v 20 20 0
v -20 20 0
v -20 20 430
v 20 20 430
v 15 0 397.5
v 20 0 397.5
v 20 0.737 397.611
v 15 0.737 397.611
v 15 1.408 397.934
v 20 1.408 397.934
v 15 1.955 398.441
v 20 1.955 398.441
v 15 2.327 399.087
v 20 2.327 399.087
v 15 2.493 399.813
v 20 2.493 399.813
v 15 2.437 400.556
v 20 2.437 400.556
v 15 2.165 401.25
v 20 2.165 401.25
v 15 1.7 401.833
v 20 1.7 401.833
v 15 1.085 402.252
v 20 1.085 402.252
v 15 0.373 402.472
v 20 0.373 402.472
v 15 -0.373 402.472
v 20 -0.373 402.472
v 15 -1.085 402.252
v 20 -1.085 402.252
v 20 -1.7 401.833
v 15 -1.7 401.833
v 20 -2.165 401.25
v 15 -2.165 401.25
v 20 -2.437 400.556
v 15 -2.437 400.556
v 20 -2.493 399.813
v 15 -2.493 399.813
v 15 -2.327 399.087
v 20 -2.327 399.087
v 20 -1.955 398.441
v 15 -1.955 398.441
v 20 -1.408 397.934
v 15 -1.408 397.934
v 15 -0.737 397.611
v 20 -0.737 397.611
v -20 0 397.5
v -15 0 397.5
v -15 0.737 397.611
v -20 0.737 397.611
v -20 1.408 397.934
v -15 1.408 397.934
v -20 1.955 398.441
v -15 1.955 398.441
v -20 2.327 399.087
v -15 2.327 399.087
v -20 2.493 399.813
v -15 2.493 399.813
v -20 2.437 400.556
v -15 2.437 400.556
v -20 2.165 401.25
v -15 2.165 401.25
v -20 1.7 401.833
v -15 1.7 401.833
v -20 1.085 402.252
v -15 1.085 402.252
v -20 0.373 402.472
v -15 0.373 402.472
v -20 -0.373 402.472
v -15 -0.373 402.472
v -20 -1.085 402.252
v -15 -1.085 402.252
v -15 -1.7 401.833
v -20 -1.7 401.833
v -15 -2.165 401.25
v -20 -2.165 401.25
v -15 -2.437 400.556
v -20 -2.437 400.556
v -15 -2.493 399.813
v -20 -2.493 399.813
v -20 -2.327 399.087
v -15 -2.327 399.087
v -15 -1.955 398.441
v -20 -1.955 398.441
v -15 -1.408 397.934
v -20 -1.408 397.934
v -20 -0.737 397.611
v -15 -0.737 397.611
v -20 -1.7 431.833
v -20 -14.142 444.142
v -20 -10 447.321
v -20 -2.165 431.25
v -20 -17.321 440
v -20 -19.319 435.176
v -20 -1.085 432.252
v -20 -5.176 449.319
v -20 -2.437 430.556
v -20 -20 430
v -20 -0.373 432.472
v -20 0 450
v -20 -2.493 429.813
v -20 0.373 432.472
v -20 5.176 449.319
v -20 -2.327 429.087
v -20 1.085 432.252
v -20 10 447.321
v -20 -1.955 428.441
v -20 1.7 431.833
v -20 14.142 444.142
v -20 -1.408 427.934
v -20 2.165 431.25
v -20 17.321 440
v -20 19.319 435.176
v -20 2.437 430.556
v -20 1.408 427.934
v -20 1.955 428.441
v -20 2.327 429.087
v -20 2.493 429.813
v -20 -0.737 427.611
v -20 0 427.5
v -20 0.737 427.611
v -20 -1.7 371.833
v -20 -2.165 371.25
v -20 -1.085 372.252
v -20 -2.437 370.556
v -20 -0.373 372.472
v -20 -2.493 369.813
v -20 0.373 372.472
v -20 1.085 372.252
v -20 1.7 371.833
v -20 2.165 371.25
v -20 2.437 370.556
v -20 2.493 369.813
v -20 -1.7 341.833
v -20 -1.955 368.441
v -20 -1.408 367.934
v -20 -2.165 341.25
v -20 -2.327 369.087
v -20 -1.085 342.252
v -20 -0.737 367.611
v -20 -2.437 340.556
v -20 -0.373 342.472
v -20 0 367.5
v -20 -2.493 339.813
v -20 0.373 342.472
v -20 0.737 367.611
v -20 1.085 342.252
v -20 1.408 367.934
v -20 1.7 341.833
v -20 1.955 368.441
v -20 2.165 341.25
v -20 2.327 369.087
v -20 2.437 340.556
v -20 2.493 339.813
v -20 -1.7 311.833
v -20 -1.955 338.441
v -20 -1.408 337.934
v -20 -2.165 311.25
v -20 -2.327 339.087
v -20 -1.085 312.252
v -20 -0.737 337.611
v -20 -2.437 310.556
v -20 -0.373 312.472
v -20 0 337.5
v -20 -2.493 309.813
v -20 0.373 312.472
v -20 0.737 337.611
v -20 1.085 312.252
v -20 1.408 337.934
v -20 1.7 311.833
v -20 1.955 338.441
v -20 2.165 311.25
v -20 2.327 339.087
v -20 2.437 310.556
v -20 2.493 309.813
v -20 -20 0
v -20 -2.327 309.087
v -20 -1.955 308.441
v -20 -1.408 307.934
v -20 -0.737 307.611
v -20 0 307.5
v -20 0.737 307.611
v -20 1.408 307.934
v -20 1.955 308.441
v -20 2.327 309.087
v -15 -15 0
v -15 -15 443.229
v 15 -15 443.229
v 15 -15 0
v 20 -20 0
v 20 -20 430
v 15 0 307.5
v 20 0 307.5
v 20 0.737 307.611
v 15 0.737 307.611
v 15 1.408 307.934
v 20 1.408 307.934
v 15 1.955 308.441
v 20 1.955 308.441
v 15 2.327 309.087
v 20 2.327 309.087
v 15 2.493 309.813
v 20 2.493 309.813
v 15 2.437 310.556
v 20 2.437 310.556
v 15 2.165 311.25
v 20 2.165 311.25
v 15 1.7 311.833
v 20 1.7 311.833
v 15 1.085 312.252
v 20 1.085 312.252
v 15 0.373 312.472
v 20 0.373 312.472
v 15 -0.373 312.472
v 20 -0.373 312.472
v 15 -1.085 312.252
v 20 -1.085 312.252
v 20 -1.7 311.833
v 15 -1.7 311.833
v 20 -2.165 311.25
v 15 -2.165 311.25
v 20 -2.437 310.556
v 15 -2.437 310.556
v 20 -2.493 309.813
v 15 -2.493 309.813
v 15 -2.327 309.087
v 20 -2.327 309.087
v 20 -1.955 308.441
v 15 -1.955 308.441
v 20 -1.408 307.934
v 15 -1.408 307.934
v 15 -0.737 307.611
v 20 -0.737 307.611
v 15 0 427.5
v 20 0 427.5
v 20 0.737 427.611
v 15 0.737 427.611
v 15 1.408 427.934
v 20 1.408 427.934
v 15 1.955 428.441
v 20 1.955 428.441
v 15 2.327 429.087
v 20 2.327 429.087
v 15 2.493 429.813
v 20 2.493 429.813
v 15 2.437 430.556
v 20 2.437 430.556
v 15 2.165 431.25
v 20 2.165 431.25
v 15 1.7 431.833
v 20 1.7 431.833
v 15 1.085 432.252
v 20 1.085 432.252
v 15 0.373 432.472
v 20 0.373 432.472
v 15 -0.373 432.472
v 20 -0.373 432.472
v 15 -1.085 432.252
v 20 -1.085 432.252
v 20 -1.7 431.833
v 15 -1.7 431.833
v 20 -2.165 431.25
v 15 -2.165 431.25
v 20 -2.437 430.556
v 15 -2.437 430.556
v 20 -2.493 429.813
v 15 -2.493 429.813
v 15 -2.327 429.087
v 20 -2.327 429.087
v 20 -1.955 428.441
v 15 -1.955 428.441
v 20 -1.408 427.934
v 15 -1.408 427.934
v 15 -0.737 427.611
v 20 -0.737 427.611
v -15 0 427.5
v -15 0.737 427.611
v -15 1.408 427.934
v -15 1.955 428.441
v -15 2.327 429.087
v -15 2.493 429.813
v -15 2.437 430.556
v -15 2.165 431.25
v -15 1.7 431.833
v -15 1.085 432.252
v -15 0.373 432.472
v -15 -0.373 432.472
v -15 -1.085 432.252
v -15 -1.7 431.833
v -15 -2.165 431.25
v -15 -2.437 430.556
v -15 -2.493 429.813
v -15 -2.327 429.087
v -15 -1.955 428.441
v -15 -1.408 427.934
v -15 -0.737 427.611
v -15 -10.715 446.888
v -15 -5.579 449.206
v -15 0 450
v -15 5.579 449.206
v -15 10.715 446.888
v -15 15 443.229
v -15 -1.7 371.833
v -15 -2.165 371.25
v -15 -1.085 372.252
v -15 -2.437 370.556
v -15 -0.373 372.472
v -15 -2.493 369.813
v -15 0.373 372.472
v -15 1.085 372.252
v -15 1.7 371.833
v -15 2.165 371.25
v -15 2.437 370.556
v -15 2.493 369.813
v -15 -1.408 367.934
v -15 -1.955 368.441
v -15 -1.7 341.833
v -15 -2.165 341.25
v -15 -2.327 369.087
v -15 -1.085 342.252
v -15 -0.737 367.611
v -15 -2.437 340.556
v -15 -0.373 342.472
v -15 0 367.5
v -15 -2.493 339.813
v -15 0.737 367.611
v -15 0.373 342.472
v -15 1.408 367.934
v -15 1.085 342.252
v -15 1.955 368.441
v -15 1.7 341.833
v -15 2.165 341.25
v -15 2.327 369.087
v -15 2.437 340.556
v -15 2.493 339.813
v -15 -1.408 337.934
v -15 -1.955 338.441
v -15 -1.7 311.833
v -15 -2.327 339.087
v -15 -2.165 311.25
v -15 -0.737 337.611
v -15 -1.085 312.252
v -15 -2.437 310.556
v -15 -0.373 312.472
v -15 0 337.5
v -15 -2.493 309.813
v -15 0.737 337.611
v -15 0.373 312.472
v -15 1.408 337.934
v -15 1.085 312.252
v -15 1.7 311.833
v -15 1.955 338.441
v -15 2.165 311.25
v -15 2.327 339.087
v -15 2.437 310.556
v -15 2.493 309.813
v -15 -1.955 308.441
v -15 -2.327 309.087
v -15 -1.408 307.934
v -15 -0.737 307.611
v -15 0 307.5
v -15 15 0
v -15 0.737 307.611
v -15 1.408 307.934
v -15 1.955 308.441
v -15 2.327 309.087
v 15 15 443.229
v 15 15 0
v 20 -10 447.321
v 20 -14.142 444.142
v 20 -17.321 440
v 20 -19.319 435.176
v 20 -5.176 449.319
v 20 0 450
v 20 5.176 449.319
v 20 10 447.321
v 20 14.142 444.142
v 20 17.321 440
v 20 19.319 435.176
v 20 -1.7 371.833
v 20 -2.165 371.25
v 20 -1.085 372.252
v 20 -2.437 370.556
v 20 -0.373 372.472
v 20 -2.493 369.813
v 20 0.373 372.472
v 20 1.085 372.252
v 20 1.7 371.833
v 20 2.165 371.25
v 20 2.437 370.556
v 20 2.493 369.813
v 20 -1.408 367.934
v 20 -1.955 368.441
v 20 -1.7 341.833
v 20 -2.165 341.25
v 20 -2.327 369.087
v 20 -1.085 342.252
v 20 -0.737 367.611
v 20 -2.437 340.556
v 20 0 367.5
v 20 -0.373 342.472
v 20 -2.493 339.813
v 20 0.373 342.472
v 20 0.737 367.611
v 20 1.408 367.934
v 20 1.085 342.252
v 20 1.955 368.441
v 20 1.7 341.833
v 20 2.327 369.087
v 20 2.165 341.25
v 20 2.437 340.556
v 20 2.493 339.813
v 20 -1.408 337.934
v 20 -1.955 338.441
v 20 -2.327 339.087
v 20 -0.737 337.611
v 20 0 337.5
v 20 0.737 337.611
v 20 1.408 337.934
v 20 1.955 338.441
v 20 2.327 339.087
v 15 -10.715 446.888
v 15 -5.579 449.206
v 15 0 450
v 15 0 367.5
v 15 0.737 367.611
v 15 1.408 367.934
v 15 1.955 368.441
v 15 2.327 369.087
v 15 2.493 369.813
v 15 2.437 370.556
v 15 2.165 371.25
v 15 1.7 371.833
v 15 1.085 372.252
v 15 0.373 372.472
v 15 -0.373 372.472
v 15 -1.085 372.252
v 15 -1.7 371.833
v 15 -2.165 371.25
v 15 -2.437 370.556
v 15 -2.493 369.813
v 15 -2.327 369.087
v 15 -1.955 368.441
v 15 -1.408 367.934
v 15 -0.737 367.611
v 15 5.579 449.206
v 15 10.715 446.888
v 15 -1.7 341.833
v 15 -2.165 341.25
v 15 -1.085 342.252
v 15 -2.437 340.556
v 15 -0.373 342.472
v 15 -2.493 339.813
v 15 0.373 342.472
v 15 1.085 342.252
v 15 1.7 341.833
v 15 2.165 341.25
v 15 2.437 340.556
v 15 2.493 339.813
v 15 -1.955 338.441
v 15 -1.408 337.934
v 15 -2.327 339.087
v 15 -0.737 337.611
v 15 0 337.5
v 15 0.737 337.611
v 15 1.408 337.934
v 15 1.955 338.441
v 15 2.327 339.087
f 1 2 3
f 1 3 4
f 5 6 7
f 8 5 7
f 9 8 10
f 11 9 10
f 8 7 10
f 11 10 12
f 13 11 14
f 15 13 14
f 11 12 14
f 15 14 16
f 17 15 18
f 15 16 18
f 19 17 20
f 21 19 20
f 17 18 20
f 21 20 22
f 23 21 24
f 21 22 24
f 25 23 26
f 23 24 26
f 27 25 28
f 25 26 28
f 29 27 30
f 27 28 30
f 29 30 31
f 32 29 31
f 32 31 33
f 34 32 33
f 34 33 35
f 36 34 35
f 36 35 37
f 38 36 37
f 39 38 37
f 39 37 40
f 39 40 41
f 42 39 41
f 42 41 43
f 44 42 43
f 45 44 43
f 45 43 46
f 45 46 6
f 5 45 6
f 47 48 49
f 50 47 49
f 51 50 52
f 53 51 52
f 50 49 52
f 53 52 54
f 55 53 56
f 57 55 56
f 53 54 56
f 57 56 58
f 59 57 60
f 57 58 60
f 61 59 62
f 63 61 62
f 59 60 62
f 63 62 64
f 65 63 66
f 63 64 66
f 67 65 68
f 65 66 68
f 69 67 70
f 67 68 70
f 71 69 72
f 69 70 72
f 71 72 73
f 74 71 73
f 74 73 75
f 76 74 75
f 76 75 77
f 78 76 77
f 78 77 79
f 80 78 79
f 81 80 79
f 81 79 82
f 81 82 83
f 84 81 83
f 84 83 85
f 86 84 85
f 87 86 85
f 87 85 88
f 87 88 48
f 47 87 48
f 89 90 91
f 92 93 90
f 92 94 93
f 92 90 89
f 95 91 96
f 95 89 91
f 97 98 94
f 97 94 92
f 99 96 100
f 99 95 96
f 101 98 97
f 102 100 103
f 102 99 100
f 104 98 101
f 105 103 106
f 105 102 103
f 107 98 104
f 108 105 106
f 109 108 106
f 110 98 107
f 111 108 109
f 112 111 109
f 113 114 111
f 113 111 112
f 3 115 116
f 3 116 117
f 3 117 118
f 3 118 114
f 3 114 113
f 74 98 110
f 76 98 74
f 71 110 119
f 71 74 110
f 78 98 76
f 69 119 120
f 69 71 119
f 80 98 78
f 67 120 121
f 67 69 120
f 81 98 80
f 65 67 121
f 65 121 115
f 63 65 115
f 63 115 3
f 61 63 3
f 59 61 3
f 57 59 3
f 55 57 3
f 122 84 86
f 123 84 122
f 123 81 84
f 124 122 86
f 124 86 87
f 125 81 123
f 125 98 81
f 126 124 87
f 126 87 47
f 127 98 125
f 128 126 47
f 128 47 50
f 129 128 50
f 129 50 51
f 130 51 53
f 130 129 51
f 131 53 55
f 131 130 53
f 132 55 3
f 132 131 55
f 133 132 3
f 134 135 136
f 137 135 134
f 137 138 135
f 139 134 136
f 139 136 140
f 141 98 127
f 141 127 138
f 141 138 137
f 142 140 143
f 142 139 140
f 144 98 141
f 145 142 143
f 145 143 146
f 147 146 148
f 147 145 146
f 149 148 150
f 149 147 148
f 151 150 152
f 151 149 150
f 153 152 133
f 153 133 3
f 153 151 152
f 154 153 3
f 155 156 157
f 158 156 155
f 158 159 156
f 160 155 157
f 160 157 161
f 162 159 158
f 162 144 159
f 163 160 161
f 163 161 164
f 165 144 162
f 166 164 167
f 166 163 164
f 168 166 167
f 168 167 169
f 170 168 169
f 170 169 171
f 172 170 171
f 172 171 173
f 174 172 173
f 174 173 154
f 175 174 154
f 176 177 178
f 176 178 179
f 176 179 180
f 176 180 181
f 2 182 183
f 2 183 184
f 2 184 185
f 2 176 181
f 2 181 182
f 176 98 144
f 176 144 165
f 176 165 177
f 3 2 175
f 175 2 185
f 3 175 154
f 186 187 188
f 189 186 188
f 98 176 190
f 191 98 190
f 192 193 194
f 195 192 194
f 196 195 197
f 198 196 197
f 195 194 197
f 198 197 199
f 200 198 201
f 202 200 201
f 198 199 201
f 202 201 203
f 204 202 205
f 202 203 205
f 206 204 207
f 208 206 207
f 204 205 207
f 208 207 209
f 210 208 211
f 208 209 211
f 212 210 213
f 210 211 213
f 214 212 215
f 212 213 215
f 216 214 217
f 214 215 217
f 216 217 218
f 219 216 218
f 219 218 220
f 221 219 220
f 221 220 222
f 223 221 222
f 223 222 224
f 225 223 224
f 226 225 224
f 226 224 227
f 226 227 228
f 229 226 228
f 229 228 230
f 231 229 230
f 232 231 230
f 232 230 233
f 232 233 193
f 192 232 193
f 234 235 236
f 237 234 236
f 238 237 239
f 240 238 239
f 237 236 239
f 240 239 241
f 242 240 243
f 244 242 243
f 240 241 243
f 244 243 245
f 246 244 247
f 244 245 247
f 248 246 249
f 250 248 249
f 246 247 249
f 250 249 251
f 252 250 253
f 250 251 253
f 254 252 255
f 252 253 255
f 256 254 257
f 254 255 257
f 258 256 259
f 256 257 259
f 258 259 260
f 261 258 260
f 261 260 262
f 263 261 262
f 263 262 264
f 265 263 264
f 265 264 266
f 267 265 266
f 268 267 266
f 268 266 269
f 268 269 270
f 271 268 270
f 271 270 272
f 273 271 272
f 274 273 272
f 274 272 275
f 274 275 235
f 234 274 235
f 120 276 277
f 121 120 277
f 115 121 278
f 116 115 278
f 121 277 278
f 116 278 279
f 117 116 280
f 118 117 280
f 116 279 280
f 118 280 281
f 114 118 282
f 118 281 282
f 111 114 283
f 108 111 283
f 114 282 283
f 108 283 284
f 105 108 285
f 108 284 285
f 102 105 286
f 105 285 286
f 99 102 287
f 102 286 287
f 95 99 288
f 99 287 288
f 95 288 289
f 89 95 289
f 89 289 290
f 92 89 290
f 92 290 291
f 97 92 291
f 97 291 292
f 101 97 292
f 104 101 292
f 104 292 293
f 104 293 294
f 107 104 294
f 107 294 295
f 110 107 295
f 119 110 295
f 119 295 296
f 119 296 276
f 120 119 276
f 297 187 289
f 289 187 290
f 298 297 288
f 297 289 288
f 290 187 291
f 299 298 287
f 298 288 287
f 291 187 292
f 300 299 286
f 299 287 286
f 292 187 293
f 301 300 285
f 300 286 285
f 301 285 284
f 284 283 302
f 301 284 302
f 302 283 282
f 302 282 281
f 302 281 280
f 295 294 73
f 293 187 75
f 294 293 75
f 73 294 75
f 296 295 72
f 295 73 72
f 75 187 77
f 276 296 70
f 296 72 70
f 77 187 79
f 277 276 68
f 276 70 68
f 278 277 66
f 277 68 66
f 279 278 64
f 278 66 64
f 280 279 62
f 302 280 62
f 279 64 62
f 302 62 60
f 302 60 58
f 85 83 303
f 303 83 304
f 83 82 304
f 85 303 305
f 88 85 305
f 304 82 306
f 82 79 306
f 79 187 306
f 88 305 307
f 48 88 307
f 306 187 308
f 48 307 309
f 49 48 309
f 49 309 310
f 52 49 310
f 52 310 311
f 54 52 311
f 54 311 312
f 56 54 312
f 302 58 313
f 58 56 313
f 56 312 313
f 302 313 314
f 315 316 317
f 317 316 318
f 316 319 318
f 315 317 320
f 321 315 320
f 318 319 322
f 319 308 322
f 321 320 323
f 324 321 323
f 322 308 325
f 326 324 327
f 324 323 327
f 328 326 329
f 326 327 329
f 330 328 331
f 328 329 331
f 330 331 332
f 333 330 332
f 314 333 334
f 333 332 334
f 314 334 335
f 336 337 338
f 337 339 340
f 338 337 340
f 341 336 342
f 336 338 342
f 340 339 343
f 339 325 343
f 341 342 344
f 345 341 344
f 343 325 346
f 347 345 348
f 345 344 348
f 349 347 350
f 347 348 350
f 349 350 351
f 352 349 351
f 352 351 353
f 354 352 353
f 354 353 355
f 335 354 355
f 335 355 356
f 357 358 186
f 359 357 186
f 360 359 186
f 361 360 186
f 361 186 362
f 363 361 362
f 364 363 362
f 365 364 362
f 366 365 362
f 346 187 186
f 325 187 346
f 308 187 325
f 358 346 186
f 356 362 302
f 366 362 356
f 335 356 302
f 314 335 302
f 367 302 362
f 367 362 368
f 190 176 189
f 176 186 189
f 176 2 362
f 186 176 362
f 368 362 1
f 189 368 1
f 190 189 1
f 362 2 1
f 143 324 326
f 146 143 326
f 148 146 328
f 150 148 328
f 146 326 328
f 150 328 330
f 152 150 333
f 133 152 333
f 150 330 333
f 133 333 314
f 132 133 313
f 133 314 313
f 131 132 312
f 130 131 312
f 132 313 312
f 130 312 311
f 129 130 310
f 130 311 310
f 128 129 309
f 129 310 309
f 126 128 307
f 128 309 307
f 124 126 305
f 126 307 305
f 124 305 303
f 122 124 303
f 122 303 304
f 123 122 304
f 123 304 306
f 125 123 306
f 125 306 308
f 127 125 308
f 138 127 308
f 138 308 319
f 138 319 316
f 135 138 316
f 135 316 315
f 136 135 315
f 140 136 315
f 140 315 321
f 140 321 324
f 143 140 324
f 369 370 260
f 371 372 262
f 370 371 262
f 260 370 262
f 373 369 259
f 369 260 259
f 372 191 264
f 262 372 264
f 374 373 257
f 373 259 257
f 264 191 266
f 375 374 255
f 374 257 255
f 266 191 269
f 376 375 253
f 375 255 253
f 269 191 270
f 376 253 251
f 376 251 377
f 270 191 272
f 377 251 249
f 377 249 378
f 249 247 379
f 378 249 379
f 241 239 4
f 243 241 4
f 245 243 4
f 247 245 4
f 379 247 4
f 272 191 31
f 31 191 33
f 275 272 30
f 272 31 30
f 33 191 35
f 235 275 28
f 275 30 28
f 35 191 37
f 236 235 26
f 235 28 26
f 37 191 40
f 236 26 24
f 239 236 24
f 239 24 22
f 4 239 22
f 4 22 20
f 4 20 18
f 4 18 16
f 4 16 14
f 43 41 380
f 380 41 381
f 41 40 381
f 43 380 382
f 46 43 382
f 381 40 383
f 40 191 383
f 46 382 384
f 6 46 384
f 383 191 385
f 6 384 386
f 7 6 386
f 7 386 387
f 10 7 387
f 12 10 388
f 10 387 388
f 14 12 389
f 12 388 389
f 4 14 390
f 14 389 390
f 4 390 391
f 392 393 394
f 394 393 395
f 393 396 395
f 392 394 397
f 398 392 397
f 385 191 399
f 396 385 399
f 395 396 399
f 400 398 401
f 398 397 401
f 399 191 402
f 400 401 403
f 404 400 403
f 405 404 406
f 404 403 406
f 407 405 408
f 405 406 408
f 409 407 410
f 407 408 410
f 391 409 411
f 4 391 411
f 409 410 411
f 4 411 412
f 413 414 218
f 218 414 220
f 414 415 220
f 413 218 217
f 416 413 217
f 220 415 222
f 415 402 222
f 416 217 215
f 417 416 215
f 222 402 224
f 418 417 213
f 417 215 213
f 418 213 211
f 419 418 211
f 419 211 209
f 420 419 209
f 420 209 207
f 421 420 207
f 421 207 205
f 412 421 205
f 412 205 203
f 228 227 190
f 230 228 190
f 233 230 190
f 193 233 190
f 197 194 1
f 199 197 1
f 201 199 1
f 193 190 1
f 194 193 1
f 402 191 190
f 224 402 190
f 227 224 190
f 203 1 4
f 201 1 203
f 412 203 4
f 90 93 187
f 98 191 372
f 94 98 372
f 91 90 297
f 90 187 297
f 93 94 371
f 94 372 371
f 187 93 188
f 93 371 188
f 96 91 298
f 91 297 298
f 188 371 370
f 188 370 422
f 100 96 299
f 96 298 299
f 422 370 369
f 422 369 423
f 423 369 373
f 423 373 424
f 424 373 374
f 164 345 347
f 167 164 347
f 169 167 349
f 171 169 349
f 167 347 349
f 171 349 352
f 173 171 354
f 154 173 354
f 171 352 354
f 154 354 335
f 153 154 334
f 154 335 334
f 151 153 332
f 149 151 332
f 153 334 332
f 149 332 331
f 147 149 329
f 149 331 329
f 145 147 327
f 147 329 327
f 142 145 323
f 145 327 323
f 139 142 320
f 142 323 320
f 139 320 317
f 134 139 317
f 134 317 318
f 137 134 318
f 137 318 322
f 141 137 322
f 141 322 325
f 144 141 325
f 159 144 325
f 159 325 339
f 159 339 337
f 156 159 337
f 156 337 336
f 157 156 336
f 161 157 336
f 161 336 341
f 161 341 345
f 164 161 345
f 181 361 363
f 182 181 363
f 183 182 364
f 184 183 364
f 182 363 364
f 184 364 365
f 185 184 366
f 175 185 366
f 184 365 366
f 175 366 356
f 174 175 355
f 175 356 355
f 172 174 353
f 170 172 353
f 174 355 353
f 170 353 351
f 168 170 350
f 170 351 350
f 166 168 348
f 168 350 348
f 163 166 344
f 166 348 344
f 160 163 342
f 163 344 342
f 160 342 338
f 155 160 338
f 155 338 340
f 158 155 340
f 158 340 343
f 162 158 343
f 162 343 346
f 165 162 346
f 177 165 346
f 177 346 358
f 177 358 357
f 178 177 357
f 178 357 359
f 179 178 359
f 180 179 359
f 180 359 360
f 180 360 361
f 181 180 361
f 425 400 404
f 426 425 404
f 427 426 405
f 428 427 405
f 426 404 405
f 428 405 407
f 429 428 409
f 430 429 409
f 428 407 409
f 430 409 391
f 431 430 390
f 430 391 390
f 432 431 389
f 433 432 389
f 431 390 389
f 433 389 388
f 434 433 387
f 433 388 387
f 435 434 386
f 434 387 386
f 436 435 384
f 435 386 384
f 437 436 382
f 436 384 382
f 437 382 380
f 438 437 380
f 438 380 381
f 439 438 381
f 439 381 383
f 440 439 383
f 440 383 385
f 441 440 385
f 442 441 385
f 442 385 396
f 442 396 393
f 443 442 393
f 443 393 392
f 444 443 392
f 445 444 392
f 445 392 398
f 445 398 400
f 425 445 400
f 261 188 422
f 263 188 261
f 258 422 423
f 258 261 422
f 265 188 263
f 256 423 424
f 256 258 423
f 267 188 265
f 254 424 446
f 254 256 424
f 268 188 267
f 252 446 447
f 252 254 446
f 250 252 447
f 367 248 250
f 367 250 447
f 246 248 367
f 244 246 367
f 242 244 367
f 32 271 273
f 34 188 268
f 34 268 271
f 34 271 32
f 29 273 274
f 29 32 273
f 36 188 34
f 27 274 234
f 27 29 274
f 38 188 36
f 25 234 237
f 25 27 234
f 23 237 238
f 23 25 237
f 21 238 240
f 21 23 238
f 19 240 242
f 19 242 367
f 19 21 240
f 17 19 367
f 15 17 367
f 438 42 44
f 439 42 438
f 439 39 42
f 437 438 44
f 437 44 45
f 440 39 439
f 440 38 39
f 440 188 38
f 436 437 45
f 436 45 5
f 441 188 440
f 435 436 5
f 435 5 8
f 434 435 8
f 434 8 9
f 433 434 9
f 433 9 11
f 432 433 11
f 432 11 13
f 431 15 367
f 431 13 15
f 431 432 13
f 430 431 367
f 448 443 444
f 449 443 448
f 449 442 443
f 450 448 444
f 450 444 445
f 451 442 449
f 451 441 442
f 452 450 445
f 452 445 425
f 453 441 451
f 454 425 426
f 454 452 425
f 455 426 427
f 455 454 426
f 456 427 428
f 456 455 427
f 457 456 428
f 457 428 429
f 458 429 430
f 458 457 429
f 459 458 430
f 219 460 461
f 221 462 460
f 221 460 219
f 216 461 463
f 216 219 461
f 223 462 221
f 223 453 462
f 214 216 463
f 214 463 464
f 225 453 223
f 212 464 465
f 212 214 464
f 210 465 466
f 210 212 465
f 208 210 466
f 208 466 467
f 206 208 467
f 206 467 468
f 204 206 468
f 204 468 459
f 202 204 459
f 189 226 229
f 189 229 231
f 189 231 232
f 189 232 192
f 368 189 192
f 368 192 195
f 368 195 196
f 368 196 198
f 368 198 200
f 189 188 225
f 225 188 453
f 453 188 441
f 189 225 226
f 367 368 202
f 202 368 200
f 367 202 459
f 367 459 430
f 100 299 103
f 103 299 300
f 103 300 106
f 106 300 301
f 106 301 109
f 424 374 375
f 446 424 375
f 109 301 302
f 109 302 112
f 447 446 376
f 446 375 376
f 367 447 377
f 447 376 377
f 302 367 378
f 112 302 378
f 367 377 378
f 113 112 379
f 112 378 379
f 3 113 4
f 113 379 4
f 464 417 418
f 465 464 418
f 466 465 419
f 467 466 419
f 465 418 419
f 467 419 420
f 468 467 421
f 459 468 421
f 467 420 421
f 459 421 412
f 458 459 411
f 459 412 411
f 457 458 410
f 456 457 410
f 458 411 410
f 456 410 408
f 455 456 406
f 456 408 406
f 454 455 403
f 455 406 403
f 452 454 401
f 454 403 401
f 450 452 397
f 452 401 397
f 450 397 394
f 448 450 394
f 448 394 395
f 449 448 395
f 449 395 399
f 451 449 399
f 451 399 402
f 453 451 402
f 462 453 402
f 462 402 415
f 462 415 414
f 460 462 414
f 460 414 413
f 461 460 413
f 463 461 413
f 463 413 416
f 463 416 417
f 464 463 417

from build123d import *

# Parameters (mm, degrees)
SKETCH1_W           = 40
SKETCH1_H           = 40
SKETCH1_W_2         = 30
SKETCH1_H_2         = 30
BOSS_EXTRUDE1_DEPTH = 450
SKETCH2_R           = 2.5
CUT_EXTRUDE1_DEPTH  = 450
CUT_EXTRUDE2_DEPTH  = 76
LPATTERN1_COUNT     = 5
LPATTERN1_PITCH     = 30


with BuildPart() as part:
    # Sketch1 → Boss-Extrude1 (new body)
    with BuildSketch(Plane.XY):
        Rectangle(SKETCH1_W, SKETCH1_H)
        Rectangle(SKETCH1_W_2, SKETCH1_H_2, mode=Mode.SUBTRACT)
    extrude(amount=BOSS_EXTRUDE1_DEPTH)

    # Sketch2 → Cut-Extrude1 (cut)
    with BuildSketch(Plane(origin=(20, 0, 0), x_dir=(0, 0, -1), z_dir=(1, 0, 0))):
        with Locations((-430, 0)):
            Circle(SKETCH2_R)
    cut_extrude1 = extrude(amount=-CUT_EXTRUDE1_DEPTH, mode=Mode.SUBTRACT)

    # Sketch3 → Cut-Extrude2 (cut)
    with BuildSketch(Plane(origin=(20, 0, 0), x_dir=(0, 0, -1), z_dir=(1, 0, 0))):
        with BuildLine():
            ThreePointArc((-450, 2.8e-07), (-444.142135525, 14.142135723), (-430, 20))
            Line((-430, 20), (-450, 20))
            Line((-450, 20), (-450, 2.8e-07))
        make_face()
        with BuildLine():
            ThreePointArc((-430, -20), (-444.142135723, -14.142135525), (-450, 2.8e-07))
            Line((-450, 2.8e-07), (-450, -20))
            Line((-450, -20), (-430, -20))
        make_face()
    extrude(amount=-CUT_EXTRUDE2_DEPTH, mode=Mode.SUBTRACT)

    # LPattern1: Cut-Extrude1 ×5
    with Locations(*[(0, 0, -i * LPATTERN1_PITCH) for i in range(1, LPATTERN1_COUNT)]):
        add(cut_extrude1, mode=Mode.SUBTRACT)


solid = part.part
